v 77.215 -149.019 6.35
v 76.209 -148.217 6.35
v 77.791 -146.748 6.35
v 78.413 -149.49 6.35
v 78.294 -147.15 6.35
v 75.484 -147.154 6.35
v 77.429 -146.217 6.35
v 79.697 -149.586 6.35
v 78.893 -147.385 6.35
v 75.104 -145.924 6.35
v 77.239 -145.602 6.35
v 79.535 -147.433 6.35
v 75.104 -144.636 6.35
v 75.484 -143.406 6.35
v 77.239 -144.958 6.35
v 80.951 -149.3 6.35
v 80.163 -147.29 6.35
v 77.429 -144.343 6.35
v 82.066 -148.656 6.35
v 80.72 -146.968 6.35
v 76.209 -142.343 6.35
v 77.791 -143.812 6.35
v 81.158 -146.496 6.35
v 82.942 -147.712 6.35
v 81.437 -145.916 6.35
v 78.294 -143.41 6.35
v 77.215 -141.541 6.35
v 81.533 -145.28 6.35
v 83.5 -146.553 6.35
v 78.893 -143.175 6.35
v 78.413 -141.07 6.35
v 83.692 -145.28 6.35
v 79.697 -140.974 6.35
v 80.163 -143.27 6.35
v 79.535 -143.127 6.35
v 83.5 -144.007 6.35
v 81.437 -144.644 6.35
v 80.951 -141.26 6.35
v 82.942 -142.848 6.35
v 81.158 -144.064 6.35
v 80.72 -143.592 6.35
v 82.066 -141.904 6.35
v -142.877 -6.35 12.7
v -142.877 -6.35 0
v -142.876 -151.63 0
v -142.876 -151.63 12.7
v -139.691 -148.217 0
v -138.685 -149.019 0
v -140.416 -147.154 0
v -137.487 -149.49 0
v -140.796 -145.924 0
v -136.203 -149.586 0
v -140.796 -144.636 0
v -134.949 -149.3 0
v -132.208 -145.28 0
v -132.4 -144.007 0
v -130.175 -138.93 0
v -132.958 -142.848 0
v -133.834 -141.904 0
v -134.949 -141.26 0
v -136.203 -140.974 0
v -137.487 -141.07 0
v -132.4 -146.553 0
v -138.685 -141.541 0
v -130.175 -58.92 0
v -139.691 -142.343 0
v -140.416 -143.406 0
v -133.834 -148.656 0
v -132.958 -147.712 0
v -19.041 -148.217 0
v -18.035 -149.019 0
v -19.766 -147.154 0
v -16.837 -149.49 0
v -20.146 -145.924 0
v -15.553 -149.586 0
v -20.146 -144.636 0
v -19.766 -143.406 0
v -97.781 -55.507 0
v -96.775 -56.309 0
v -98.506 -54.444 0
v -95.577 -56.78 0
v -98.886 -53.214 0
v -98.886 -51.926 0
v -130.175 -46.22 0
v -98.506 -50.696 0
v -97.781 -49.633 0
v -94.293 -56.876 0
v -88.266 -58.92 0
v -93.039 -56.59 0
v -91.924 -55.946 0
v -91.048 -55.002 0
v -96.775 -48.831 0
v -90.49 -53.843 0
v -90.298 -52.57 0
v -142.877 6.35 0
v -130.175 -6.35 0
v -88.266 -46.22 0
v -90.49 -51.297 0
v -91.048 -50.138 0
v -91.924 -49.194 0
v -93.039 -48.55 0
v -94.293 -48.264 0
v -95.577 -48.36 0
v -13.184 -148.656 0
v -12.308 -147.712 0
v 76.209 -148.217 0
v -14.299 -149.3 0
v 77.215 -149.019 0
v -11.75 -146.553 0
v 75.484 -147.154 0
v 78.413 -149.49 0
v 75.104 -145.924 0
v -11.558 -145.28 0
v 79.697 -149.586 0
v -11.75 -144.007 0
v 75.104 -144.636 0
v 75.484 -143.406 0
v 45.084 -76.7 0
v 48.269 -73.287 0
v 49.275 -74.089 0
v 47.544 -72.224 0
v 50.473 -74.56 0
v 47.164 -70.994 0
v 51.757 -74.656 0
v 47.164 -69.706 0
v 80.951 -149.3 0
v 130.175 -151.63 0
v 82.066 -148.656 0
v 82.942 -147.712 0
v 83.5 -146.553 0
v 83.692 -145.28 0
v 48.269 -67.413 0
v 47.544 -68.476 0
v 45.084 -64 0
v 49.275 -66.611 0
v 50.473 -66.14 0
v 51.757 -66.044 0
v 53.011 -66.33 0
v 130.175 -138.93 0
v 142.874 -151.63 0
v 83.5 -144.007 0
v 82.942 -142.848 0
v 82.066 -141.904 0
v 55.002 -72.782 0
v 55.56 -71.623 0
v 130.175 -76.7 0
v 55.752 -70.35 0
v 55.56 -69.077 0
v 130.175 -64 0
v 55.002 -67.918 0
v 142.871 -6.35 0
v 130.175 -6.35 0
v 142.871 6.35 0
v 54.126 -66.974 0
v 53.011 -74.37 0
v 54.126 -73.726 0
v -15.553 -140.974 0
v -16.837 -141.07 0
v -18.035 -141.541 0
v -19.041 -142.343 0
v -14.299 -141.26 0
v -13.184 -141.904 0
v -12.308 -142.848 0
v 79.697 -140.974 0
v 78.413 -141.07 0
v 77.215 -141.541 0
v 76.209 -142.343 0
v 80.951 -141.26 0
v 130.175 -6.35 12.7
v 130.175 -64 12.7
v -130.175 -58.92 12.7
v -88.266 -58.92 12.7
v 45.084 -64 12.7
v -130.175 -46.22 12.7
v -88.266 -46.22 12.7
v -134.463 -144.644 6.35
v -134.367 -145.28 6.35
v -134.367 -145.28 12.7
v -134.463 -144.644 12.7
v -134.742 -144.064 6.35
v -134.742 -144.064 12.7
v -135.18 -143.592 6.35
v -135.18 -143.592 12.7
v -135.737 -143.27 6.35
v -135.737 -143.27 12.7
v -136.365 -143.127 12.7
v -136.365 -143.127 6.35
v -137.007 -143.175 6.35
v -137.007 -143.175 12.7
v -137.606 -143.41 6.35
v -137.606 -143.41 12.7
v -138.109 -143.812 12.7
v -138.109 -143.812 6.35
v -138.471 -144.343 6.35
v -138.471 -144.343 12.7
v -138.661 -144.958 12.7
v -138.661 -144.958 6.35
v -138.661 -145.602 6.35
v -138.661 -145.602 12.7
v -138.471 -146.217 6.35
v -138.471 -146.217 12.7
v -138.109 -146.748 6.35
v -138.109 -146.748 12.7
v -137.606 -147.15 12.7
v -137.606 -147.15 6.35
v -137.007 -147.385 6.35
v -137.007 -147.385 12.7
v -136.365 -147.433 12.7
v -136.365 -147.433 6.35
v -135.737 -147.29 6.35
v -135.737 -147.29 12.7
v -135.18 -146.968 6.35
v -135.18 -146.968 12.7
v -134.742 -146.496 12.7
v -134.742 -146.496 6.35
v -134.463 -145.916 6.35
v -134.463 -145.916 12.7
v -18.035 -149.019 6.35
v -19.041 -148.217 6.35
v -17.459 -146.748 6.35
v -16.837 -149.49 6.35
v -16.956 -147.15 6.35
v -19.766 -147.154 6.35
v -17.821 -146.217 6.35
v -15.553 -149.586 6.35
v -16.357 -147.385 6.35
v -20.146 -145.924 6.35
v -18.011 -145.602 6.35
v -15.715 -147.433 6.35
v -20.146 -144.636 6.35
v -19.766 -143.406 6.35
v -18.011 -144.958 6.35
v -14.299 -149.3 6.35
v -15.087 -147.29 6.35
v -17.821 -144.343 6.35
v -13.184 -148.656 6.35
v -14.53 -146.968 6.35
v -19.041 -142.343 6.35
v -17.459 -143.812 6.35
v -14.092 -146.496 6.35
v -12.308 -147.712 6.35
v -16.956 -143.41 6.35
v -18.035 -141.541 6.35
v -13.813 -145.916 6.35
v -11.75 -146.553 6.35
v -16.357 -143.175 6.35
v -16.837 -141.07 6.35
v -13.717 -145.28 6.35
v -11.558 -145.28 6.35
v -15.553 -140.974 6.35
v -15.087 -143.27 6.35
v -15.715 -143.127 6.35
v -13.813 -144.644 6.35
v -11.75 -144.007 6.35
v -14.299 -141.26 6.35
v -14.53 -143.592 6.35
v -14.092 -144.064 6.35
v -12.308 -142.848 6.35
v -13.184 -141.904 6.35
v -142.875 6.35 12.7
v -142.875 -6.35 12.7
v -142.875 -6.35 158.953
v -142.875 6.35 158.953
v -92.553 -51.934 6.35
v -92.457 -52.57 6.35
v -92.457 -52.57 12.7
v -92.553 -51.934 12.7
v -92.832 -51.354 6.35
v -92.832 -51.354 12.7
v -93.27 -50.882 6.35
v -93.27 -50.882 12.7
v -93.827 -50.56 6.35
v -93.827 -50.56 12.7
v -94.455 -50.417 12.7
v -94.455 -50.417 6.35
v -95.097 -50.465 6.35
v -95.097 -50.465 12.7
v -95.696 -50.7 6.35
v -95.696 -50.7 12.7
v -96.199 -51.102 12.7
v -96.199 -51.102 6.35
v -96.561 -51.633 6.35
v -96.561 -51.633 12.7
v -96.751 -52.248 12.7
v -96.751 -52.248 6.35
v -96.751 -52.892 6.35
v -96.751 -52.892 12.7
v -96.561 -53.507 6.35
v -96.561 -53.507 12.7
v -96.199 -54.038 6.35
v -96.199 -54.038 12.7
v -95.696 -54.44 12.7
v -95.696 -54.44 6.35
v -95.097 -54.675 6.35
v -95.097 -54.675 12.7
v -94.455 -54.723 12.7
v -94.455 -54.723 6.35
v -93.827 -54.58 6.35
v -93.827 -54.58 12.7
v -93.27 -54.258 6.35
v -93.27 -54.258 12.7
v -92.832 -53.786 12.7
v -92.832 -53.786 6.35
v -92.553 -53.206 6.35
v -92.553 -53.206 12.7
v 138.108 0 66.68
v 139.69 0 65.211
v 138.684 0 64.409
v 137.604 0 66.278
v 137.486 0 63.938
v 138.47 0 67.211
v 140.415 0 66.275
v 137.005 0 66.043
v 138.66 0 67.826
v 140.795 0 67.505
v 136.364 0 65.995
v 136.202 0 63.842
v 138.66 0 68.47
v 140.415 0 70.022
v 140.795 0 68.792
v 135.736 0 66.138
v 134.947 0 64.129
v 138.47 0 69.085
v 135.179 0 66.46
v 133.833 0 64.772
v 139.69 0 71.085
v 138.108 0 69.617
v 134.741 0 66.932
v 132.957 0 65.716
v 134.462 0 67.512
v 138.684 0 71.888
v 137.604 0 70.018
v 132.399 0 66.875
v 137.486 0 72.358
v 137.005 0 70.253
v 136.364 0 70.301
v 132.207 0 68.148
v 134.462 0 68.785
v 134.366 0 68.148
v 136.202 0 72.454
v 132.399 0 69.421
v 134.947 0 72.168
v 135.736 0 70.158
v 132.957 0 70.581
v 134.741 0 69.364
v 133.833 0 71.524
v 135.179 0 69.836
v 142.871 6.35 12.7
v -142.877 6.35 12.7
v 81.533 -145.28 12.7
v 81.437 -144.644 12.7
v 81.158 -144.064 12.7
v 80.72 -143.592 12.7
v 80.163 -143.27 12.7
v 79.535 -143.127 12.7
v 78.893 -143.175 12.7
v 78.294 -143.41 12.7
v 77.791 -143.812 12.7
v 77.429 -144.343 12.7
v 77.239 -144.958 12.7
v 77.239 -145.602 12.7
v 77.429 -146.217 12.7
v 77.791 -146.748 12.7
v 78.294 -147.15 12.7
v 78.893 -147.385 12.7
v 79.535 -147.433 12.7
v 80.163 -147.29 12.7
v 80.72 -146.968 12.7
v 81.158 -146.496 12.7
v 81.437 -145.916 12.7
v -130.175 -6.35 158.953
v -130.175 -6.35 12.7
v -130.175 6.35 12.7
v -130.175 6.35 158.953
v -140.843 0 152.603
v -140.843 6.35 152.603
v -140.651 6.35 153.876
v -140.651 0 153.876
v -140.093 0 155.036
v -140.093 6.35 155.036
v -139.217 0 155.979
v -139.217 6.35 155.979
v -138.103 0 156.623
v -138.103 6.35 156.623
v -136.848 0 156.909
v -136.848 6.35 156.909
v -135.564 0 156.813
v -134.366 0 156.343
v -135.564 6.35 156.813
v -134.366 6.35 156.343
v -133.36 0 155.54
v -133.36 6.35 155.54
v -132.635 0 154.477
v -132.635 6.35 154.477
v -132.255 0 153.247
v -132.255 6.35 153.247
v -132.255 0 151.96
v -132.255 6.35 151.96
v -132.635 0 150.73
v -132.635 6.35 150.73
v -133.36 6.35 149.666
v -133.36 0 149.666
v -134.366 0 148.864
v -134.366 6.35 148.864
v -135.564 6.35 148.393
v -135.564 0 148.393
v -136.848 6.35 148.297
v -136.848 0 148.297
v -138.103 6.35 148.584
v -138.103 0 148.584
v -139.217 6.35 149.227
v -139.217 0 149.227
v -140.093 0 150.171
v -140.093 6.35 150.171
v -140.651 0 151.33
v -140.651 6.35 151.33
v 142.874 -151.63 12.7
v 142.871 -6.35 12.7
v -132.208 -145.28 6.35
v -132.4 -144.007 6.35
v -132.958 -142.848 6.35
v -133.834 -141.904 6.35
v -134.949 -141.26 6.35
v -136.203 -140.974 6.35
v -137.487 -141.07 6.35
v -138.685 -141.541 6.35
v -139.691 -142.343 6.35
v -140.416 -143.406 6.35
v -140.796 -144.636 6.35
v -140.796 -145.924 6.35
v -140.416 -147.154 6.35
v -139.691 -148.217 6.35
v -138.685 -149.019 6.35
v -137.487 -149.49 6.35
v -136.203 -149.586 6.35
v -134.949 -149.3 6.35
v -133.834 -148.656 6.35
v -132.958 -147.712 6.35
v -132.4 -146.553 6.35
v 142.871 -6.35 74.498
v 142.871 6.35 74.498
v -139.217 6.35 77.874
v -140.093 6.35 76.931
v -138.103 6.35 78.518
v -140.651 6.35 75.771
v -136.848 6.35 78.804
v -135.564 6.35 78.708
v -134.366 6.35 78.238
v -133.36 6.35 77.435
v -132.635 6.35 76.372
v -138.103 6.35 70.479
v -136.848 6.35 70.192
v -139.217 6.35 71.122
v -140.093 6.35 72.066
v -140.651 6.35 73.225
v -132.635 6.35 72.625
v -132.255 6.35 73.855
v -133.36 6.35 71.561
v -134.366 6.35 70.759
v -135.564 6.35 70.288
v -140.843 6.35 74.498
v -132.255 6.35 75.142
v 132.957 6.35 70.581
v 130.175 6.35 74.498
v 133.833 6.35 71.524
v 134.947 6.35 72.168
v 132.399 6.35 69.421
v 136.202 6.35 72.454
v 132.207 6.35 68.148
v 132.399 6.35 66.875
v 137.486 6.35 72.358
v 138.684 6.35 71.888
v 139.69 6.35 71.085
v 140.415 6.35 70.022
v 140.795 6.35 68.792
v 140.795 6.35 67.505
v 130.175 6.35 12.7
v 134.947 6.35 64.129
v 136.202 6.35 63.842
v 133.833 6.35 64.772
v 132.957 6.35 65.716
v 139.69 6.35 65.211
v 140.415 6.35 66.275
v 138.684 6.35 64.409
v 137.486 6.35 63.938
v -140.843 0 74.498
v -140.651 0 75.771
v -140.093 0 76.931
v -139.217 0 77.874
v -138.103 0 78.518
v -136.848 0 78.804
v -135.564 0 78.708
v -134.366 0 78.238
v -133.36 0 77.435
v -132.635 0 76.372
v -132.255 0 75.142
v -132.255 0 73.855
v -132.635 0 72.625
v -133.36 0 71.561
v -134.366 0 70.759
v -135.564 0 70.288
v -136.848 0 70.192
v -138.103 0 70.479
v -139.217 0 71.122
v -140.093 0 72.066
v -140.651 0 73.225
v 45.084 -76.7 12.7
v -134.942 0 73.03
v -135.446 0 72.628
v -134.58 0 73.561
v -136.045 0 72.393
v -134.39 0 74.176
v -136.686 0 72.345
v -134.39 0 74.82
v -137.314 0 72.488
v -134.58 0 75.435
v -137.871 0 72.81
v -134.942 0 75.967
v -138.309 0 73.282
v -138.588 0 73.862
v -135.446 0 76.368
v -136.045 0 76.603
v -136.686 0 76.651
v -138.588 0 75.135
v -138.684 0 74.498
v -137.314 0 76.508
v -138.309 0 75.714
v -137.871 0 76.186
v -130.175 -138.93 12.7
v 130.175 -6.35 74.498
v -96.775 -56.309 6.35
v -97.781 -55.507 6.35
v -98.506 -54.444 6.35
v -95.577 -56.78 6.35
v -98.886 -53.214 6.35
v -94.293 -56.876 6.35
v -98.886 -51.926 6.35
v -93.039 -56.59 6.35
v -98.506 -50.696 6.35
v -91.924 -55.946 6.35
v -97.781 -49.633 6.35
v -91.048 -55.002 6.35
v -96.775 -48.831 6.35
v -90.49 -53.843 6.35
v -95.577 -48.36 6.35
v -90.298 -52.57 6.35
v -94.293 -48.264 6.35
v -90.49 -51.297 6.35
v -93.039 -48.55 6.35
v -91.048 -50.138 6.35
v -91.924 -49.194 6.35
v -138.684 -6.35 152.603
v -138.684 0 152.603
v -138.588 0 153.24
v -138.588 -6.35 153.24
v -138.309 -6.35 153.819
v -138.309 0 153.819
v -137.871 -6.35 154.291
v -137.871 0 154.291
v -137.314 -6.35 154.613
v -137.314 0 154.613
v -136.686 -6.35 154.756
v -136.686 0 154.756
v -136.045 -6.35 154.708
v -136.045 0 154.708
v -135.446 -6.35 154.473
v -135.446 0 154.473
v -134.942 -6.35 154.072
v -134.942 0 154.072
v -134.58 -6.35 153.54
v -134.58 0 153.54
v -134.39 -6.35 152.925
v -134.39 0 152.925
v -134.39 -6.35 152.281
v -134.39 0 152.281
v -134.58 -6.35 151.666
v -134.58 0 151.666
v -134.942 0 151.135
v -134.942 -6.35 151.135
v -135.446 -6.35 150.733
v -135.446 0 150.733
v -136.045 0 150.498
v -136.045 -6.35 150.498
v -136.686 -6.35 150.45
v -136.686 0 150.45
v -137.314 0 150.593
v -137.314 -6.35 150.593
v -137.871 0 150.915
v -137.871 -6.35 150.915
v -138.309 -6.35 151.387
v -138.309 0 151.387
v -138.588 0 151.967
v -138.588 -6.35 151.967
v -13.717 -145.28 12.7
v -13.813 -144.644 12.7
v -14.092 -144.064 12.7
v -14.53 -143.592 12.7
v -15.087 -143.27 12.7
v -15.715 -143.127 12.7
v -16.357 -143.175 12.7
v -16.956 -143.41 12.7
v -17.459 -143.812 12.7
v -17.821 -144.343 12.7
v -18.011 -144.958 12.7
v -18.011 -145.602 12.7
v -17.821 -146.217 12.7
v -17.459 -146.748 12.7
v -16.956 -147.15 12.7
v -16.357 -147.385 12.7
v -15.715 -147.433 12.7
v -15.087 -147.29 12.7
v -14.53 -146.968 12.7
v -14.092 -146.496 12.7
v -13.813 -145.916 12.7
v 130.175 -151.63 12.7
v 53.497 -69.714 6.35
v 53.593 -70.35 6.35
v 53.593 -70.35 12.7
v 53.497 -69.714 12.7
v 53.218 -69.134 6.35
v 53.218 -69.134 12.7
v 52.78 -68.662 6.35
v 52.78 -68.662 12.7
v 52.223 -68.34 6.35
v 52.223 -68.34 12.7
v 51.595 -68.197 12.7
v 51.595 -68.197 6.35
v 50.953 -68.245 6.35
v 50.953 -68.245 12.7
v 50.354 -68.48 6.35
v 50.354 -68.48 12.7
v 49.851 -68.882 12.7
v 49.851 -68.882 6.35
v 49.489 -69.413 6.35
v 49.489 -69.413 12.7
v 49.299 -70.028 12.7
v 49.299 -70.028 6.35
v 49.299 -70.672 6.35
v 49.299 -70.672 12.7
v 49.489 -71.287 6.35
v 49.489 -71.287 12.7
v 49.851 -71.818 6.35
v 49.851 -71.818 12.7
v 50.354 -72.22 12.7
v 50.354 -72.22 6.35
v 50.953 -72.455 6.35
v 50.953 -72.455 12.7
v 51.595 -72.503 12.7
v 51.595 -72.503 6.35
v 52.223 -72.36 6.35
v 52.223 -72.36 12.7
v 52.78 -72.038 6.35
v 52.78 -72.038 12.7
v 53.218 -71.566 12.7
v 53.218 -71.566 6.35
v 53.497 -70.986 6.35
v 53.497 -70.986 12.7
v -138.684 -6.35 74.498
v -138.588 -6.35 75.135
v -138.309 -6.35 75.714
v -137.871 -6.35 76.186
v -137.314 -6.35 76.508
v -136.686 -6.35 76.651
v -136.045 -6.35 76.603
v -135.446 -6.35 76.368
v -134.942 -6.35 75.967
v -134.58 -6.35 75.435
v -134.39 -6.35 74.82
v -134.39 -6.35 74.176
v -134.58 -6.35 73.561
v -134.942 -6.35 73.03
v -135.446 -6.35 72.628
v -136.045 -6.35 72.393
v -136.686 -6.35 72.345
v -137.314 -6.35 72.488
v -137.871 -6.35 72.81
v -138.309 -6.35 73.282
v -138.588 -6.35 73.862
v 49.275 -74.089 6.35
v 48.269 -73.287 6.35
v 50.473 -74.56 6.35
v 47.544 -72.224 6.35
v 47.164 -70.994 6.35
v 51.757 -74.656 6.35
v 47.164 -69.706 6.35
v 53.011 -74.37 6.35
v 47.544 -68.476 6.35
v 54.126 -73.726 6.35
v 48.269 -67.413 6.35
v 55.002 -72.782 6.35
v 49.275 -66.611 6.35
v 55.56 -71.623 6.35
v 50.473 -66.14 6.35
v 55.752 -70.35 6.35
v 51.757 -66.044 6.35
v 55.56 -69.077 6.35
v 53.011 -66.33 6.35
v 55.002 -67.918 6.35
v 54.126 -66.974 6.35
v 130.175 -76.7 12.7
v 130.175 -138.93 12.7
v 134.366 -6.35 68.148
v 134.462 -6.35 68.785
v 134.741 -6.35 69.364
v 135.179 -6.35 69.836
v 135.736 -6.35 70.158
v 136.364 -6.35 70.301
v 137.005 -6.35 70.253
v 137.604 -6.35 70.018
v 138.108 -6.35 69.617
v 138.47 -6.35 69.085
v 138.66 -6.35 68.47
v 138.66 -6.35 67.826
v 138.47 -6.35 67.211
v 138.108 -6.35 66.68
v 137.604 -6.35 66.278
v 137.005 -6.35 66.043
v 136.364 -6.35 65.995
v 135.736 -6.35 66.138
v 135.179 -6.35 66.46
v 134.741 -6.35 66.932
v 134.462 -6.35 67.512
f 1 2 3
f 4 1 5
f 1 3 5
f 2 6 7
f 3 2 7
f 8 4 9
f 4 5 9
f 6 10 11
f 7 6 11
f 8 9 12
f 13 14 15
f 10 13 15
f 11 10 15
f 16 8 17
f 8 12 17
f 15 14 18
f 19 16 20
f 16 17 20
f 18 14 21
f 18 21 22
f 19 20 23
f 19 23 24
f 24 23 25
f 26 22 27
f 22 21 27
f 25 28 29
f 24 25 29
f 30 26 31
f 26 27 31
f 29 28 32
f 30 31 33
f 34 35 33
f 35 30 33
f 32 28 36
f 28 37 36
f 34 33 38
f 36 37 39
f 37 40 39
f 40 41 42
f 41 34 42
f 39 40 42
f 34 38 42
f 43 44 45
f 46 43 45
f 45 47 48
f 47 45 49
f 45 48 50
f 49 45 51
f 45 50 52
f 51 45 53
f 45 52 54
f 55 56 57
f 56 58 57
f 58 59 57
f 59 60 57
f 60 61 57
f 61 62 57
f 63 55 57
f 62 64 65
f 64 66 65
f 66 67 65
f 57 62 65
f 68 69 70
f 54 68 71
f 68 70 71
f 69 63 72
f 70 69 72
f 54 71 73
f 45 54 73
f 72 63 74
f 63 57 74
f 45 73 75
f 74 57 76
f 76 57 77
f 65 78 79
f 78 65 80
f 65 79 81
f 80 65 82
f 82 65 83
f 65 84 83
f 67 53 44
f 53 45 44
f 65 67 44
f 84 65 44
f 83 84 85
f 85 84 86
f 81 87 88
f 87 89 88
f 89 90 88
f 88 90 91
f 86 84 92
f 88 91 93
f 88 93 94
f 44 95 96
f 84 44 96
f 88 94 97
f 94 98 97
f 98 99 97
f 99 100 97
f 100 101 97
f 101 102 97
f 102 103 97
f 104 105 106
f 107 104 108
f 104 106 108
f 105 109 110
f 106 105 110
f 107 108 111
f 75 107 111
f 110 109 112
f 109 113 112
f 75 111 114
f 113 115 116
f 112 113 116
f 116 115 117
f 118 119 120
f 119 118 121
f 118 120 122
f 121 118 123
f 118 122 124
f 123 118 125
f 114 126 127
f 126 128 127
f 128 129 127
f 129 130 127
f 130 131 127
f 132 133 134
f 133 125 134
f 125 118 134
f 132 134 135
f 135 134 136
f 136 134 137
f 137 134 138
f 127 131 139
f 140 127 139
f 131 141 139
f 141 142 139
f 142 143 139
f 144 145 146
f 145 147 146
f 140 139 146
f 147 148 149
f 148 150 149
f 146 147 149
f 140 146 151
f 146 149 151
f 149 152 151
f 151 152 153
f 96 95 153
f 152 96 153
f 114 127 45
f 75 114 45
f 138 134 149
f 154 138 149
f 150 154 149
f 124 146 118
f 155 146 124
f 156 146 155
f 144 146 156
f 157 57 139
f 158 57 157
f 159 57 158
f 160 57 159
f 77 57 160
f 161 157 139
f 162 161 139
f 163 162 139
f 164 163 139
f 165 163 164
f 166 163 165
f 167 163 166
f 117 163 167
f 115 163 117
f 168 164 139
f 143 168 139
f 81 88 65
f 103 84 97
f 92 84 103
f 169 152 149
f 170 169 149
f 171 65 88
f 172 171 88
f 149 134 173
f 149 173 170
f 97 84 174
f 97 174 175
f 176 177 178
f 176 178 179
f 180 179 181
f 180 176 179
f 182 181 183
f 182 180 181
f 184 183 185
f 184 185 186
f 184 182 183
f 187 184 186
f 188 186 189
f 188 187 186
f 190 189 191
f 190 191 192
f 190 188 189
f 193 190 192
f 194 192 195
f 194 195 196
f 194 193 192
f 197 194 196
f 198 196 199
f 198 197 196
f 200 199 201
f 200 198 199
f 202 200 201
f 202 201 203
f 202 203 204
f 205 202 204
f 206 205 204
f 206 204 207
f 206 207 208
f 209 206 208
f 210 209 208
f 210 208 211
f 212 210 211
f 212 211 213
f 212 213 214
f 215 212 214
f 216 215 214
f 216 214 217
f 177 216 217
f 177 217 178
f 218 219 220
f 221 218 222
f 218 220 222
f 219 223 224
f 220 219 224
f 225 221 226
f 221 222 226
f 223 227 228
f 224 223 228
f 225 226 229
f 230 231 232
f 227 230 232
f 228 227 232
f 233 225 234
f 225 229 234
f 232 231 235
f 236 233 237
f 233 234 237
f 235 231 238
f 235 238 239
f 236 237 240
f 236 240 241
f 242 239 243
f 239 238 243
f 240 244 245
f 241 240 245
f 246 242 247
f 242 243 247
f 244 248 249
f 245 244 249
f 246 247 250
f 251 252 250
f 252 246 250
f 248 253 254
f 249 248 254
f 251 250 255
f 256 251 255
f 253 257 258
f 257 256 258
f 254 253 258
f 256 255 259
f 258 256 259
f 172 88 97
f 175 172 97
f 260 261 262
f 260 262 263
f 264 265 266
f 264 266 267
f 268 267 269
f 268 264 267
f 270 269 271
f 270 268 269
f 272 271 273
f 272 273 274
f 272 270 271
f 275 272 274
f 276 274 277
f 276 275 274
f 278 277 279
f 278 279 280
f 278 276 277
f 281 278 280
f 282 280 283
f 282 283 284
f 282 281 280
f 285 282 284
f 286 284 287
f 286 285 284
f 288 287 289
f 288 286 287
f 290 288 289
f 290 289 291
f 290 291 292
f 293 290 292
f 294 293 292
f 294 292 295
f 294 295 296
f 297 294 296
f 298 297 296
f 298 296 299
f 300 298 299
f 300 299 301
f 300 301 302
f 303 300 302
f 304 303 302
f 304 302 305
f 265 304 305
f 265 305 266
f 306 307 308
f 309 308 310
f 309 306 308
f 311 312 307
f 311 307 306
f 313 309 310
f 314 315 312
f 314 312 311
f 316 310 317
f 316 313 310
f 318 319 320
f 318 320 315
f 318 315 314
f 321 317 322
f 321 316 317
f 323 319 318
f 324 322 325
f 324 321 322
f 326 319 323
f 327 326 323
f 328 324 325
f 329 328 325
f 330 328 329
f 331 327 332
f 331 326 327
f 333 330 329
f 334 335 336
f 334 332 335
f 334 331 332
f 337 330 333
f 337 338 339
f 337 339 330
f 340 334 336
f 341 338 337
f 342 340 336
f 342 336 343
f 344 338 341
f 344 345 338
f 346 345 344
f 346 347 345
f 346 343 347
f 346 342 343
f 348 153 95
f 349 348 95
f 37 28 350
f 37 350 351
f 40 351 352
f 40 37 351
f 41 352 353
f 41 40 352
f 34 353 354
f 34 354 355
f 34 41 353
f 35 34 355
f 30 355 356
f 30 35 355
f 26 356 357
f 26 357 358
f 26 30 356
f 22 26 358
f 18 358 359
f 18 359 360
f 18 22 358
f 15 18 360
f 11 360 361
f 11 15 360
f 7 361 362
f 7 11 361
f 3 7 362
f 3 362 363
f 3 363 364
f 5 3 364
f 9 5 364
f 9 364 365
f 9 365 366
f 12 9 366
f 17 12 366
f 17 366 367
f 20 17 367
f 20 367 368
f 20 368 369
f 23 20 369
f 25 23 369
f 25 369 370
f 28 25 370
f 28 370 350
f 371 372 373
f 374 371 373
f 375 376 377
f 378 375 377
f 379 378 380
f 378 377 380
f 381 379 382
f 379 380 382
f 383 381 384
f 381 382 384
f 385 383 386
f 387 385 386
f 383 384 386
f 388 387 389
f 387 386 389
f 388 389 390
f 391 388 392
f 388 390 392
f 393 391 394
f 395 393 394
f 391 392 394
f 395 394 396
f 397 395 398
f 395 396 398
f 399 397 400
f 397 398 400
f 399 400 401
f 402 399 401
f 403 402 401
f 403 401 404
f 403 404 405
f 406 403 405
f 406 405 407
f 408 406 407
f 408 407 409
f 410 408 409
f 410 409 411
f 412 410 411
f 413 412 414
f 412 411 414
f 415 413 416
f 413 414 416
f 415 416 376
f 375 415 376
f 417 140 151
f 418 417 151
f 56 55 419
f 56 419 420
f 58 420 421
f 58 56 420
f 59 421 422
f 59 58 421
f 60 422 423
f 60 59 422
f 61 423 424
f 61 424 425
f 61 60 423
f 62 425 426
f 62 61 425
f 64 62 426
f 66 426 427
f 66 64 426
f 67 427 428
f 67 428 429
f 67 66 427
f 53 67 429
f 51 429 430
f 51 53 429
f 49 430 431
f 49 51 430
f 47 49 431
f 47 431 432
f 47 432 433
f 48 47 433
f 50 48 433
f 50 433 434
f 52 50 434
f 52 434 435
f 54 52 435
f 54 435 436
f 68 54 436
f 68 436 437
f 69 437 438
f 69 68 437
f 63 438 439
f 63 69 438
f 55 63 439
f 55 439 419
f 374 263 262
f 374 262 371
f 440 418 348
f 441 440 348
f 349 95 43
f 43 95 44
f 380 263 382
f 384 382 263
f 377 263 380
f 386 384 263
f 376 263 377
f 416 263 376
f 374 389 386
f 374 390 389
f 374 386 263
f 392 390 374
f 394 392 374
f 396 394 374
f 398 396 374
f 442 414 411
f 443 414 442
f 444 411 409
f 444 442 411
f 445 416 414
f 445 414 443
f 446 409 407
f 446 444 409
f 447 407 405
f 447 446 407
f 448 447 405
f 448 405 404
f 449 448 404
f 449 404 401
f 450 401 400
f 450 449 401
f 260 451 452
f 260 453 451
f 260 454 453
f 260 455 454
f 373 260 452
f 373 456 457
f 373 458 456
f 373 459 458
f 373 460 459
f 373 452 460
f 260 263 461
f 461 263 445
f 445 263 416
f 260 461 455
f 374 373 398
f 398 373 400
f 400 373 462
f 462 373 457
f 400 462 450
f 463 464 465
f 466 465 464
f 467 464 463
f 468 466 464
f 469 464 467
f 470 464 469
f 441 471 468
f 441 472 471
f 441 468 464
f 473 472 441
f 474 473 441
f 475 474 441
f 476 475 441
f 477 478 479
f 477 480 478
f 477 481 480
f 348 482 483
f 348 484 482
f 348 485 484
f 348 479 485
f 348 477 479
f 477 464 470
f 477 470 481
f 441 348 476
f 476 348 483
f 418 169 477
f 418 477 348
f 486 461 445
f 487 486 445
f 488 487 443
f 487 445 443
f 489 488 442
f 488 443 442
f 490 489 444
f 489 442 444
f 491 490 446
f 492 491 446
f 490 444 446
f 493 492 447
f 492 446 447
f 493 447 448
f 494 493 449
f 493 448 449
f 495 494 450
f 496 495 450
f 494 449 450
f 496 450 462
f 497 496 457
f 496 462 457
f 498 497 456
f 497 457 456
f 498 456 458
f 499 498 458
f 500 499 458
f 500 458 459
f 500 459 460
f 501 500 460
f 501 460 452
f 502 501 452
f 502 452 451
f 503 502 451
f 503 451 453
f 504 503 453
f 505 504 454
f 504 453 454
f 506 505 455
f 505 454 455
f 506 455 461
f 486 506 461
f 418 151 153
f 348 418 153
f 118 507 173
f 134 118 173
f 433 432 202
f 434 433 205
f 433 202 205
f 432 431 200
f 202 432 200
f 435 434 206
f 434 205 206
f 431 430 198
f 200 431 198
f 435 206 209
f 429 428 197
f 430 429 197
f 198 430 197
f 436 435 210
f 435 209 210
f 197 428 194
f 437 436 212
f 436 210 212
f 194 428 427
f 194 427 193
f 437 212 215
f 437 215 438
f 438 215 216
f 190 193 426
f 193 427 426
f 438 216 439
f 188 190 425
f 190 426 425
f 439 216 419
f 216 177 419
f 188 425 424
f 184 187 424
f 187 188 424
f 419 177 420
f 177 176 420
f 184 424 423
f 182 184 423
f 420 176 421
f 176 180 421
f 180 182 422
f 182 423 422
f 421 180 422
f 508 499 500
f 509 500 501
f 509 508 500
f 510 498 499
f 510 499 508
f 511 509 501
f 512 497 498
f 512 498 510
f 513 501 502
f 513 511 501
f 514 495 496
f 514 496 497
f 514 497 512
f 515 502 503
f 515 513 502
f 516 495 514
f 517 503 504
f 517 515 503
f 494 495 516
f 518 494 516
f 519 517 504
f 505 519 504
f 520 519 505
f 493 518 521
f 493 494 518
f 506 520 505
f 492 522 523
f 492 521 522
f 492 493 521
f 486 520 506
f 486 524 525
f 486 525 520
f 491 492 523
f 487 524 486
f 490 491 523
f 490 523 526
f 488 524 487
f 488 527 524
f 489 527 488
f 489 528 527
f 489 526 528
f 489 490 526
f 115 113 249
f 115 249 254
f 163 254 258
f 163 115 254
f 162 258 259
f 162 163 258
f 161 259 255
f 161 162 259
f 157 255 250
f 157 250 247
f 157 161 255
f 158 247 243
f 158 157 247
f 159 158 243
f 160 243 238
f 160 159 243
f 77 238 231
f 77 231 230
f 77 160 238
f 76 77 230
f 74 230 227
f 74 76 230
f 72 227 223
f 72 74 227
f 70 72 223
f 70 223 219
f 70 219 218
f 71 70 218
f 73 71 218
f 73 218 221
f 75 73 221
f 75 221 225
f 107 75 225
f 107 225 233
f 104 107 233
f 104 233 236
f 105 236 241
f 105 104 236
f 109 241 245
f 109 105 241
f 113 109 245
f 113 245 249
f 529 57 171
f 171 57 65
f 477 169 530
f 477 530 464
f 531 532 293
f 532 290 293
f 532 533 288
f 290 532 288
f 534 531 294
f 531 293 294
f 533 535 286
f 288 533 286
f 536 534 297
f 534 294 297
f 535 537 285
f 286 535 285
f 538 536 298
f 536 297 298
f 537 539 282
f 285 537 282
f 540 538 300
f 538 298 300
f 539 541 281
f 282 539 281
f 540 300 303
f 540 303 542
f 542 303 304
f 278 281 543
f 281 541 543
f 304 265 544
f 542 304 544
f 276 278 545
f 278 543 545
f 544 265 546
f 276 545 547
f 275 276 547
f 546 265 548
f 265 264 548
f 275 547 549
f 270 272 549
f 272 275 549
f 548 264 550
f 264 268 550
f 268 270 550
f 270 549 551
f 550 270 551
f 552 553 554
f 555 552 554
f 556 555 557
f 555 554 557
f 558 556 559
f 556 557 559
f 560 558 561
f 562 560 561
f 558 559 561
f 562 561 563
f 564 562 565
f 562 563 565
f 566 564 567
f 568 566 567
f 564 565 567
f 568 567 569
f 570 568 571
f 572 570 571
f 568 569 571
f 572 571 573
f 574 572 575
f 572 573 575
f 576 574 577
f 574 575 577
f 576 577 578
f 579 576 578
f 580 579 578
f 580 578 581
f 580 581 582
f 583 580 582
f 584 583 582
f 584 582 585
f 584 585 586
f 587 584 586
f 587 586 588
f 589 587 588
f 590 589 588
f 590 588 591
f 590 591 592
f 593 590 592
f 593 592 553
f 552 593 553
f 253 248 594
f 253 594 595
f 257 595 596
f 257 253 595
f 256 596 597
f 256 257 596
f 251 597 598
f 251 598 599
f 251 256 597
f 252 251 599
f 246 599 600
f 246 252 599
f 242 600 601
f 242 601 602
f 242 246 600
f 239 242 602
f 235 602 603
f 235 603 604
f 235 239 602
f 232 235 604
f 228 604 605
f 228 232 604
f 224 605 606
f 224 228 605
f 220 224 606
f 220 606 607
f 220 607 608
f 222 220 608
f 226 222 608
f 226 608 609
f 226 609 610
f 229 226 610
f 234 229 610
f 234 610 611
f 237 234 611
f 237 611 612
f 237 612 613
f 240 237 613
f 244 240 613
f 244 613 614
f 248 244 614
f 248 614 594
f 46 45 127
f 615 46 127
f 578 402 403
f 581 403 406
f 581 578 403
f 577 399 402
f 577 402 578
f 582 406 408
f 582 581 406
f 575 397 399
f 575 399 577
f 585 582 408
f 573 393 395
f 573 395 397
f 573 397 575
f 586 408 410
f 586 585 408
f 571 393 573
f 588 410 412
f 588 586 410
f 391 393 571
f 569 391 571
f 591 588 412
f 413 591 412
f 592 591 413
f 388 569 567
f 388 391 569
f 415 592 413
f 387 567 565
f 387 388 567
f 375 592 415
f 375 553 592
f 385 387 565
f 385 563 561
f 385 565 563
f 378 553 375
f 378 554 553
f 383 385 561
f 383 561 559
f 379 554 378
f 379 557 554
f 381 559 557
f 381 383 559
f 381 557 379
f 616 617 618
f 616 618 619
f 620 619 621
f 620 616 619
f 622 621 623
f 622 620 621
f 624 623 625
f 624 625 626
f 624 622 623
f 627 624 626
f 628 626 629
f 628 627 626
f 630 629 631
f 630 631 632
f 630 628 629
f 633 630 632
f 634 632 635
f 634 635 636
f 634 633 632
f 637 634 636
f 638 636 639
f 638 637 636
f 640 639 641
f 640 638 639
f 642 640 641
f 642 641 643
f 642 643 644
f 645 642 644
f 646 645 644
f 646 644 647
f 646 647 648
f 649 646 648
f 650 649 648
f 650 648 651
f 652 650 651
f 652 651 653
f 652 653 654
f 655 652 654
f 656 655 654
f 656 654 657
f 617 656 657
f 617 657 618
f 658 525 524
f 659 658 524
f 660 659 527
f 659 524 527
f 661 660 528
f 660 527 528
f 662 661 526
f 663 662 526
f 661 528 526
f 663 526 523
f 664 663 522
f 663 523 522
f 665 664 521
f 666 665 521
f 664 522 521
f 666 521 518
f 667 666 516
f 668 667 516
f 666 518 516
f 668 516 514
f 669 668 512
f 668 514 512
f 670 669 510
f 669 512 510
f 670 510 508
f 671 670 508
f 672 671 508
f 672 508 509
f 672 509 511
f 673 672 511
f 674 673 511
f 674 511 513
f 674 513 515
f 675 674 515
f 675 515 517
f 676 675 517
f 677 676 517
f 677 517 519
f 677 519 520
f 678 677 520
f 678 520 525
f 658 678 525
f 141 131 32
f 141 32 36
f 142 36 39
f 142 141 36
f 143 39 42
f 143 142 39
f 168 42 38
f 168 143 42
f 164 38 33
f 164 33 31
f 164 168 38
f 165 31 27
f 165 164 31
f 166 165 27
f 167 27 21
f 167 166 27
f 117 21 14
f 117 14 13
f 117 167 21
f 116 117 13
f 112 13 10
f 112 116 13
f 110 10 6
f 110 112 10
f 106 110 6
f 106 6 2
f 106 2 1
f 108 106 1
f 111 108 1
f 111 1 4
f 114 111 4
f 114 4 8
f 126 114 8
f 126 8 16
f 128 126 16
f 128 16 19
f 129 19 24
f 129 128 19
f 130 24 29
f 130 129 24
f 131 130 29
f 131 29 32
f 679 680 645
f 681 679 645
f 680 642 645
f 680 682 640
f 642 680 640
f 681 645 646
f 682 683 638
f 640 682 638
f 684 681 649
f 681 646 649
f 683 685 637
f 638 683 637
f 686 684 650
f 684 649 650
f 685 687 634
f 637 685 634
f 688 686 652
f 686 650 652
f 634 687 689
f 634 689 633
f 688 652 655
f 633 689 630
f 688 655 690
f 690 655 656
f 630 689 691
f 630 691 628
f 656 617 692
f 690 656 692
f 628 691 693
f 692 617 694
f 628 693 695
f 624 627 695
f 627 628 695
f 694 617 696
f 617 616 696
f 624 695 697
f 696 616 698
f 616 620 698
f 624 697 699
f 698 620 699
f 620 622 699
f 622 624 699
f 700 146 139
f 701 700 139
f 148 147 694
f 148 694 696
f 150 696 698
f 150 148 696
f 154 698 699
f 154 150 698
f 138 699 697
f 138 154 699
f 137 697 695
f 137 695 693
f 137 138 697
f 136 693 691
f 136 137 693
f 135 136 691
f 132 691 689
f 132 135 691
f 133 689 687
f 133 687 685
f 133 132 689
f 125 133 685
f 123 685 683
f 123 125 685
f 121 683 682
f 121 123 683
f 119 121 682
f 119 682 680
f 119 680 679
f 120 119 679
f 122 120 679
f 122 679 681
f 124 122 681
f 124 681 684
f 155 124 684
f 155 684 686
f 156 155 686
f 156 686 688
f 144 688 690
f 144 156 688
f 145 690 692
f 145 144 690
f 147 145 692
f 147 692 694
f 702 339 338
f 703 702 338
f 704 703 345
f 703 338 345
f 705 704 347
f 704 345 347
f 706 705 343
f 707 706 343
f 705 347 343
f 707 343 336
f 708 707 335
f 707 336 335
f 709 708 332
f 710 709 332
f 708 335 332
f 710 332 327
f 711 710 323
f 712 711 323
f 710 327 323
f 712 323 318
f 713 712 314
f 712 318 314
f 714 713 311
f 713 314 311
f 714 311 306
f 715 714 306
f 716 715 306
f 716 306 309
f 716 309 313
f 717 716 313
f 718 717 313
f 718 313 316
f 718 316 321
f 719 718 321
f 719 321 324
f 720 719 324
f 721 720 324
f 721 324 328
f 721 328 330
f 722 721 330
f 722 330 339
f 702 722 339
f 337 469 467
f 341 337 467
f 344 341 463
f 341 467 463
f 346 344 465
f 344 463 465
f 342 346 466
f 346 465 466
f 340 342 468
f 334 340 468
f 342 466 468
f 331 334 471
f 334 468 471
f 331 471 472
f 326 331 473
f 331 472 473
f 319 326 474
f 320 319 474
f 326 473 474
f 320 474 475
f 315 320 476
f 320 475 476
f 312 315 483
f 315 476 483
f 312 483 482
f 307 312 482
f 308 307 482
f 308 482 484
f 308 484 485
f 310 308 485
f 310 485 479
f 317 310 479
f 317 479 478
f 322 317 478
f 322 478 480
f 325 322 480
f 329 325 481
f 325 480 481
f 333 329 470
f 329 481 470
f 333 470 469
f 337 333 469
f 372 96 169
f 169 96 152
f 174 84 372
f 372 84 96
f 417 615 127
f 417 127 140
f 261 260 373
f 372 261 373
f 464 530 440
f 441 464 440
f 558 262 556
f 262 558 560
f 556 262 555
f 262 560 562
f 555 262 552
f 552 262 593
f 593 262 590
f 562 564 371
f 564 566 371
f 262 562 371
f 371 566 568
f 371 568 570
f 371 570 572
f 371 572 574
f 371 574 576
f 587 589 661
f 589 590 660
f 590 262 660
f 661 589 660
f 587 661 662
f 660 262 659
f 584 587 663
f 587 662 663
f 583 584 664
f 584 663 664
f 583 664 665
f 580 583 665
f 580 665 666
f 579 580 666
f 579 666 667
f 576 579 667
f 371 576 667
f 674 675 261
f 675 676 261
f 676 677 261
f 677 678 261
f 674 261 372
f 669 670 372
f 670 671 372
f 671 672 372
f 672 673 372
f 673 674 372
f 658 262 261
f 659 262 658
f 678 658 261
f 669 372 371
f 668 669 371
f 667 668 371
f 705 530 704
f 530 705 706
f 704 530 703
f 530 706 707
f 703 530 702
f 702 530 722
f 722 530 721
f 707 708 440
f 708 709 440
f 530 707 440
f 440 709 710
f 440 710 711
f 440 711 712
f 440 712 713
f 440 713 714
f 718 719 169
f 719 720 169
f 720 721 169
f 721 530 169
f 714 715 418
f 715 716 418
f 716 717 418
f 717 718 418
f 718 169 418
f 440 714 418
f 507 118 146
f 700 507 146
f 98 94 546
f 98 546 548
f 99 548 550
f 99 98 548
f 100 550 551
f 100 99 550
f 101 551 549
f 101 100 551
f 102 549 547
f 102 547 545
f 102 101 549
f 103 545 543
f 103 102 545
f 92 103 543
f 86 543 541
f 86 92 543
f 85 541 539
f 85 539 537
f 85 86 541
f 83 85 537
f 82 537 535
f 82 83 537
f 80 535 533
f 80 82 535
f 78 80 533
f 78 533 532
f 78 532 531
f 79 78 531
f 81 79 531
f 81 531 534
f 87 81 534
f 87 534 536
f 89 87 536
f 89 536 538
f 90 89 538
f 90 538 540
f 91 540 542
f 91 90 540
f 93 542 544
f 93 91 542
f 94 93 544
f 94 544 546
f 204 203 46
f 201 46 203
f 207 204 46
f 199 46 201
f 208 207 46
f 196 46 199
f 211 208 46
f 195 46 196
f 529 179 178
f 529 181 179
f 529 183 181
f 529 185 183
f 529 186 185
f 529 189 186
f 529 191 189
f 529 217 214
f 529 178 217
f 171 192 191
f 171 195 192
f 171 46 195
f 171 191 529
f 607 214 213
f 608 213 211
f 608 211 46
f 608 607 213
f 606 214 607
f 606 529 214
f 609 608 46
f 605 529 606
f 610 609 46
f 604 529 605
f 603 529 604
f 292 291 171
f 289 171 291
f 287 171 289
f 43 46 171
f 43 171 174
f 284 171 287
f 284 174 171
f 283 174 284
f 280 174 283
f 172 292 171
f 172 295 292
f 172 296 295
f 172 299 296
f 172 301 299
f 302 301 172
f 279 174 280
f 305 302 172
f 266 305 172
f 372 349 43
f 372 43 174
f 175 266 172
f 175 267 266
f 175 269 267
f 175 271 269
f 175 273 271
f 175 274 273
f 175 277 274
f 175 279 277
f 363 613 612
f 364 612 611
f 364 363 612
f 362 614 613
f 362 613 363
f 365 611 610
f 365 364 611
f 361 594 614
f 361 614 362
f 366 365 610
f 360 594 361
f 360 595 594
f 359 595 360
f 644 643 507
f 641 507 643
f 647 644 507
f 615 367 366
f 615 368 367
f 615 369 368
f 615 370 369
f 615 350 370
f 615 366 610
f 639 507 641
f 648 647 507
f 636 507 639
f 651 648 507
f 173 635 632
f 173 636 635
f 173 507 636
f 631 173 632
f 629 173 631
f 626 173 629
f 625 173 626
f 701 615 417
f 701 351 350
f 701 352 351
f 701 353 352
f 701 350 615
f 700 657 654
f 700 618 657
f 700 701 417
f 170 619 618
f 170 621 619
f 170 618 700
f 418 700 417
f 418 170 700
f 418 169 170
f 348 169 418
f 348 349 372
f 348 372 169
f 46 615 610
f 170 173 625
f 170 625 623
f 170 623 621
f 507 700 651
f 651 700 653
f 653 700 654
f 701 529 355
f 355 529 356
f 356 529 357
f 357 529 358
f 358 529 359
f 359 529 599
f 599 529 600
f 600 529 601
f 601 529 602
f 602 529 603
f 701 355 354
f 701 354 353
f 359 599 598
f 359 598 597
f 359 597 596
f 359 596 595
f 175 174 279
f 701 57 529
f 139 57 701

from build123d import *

# Parameters (mm, degrees)
F0_R      = 4.318
F0_W      = 260.35
F0_H      = 12.7
F0_W_2    = 41.9088844856
F0_W_3    = 12.695625494
F0_W_4    = 85.0911155144
F0_R_2    = 2.159
F1_DEPTH  = 12.7
F2_W      = 12.7
F2_H      = 12.7
F3_DEPTH  = 146.2532
F2_W_2    = 12.695625494
F4_DEPTH  = 61.7982
F6_R      = 2.159
F7_DEPTH  = 12.7
F5_R      = 2.159
F8_DEPTH  = 12.7
F6_R_2    = 4.318
F9_DEPTH  = 6.35
F5_R_2    = 4.318
F10_DEPTH = 6.35
F11_DEPTH = 6.35


# Not quite as in the source:
# - a feature names something its author has since deleted; it is built from what else it names


with BuildPart() as f1:
    # F0 (on Top) → F1 (new body)
    with BuildSketch(Plane.XY):
        Polygon((-142.8771033979, -6.35), (-142.8756433805, -151.63), (-130.175, -151.63), (-130.175, -138.93), (-130.175, -58.92), (-130.175, -46.22), (-130.175, -6.35), align=None)
        with Locations((-136.5261155144, -145.28)):
            Circle(F0_R, mode=Mode.SUBTRACT)
        with Locations((0, -145.28)):
            Rectangle(F0_W, F0_H)
        with Locations((-15.8761155144, -145.28)):
            Circle(F0_R, mode=Mode.SUBTRACT)
        with Locations((79.3738844856, -145.28)):
            Circle(F0_R, mode=Mode.SUBTRACT)
        Polygon((-142.8772310289, 6.35), (-142.8771033979, -6.35), (-130.175, -6.35), (-130.175, 6.35), align=None)
        Polygon((130.175, -138.93), (130.175, -151.63), (142.8736619349, -151.6297345897), (142.870625494, -6.35), (130.175, -6.35), (130.175, -64), (130.175, -76.7), align=None)
        Rectangle(F0_W, F0_H)
        with Locations((-109.2205577572, -52.57)):
            Rectangle(F0_W_2, F0_H)
        with Locations((-94.6161155144, -52.57)):
            Circle(F0_R, mode=Mode.SUBTRACT)
        with Locations((136.522812747, 0)):
            Rectangle(F0_W_3, F0_H)
        with Locations((87.6294422428, -70.35)):
            Rectangle(F0_W_4, F0_H)
        with Locations((51.4338844856, -70.35)):
            Circle(F0_R, mode=Mode.SUBTRACT)
        with Locations((-94.6161155144, -52.57)):
            Circle(F0_R)
        with Locations((-94.6161155144, -52.57)):
            Circle(F0_R_2, mode=Mode.SUBTRACT)
        with Locations((51.4338844856, -70.35)):
            Circle(F0_R)
        with Locations((51.4338844856, -70.35)):
            Circle(F0_R_2, mode=Mode.SUBTRACT)
        with Locations((-136.5261155144, -145.28)):
            Circle(F0_R)
        with Locations((-136.5261155144, -145.28)):
            Circle(F0_R_2, mode=Mode.SUBTRACT)
        with Locations((-15.8761155144, -145.28)):
            Circle(F0_R)
        with Locations((-15.8761155144, -145.28)):
            Circle(F0_R_2, mode=Mode.SUBTRACT)
        with Locations((79.3738844856, -145.28)):
            Circle(F0_R)
        with Locations((79.3738844856, -145.28)):
            Circle(F0_R_2, mode=Mode.SUBTRACT)
    extrude(amount=F1_DEPTH)

    # F0 (on Top) → F11 (cut)
    with BuildSketch(Plane.XY):
        with Locations((-136.5261155144, -145.28)):
            Circle(F0_R)
        with Locations((-136.5261155144, -145.28)):
            Circle(F0_R_2, mode=Mode.SUBTRACT)
        with Locations((-15.8761155144, -145.28)):
            Circle(F0_R)
        with Locations((-15.8761155144, -145.28)):
            Circle(F0_R_2, mode=Mode.SUBTRACT)
        with Locations((79.3738844856, -145.28)):
            Circle(F0_R)
        with Locations((79.3738844856, -145.28)):
            Circle(F0_R_2, mode=Mode.SUBTRACT)
        with Locations((51.4338844856, -70.35)):
            Circle(F0_R)
        with Locations((51.4338844856, -70.35)):
            Circle(F0_R_2, mode=Mode.SUBTRACT)
        with Locations((-94.6161155144, -52.57)):
            Circle(F0_R)
        with Locations((-94.6161155144, -52.57)):
            Circle(F0_R_2, mode=Mode.SUBTRACT)
    extrude(amount=F11_DEPTH, mode=Mode.SUBTRACT)


with BuildPart() as f3:
    # F2 (on face) → F3 (new body)
    with BuildSketch(Plane.XY.offset(12.7)):
        with Locations((-136.525, 0)):
            Rectangle(F2_W, F2_H)
    extrude(amount=F3_DEPTH)

    # F5 (on face) → F8 (cut, through all)
    with BuildSketch(Plane(origin=(0, 6.35, 0), x_dir=(-1, 0, 0), z_dir=(0, 1, 0))):
        with Locations((136.525, 152.6032)):
            Circle(F5_R)
        with Locations((136.525, 74.4982)):
            Circle(F5_R)
    extrude(amount=-F8_DEPTH, mode=Mode.SUBTRACT)

    # F5 (on face) → F10 (cut)
    with BuildSketch(Plane(origin=(0, 6.35, 0), x_dir=(-1, 0, 0), z_dir=(0, 1, 0))):
        with Locations((136.525, 152.6032)):
            Circle(F5_R_2)
        with Locations((136.525, 152.6032)):
            Circle(F5_R, mode=Mode.SUBTRACT)
        with Locations((136.525, 74.4982)):
            Circle(F5_R_2)
        with Locations((136.525, 74.4982)):
            Circle(F5_R, mode=Mode.SUBTRACT)
    extrude(amount=-F10_DEPTH, mode=Mode.SUBTRACT)


with BuildPart() as f4:
    # F2 (on face) → F4 (new body)
    with BuildSketch(Plane.XY.offset(12.7)):
        with Locations((136.522812747, 0)):
            Rectangle(F2_W_2, F2_H)
    extrude(amount=F4_DEPTH)

    # F6 (on face) → F7 (cut, through all)
    with BuildSketch(Plane(origin=(0, 6.35, 0), x_dir=(-1, 0, 0), z_dir=(0, 1, 0))):
        with Locations((-136.525, 68.1482)):
            Circle(F6_R)
    extrude(amount=-F7_DEPTH, mode=Mode.SUBTRACT)

    # F6 (on face) → F9 (cut)
    with BuildSketch(Plane(origin=(0, 6.35, 0), x_dir=(-1, 0, 0), z_dir=(0, 1, 0))):
        with Locations((-136.525, 68.1482)):
            Circle(F6_R_2)
        with Locations((-136.525, 68.1482)):
            Circle(F6_R, mode=Mode.SUBTRACT)
    extrude(amount=-F9_DEPTH, mode=Mode.SUBTRACT)


solid = Compound([f1.part, f3.part, f4.part])
